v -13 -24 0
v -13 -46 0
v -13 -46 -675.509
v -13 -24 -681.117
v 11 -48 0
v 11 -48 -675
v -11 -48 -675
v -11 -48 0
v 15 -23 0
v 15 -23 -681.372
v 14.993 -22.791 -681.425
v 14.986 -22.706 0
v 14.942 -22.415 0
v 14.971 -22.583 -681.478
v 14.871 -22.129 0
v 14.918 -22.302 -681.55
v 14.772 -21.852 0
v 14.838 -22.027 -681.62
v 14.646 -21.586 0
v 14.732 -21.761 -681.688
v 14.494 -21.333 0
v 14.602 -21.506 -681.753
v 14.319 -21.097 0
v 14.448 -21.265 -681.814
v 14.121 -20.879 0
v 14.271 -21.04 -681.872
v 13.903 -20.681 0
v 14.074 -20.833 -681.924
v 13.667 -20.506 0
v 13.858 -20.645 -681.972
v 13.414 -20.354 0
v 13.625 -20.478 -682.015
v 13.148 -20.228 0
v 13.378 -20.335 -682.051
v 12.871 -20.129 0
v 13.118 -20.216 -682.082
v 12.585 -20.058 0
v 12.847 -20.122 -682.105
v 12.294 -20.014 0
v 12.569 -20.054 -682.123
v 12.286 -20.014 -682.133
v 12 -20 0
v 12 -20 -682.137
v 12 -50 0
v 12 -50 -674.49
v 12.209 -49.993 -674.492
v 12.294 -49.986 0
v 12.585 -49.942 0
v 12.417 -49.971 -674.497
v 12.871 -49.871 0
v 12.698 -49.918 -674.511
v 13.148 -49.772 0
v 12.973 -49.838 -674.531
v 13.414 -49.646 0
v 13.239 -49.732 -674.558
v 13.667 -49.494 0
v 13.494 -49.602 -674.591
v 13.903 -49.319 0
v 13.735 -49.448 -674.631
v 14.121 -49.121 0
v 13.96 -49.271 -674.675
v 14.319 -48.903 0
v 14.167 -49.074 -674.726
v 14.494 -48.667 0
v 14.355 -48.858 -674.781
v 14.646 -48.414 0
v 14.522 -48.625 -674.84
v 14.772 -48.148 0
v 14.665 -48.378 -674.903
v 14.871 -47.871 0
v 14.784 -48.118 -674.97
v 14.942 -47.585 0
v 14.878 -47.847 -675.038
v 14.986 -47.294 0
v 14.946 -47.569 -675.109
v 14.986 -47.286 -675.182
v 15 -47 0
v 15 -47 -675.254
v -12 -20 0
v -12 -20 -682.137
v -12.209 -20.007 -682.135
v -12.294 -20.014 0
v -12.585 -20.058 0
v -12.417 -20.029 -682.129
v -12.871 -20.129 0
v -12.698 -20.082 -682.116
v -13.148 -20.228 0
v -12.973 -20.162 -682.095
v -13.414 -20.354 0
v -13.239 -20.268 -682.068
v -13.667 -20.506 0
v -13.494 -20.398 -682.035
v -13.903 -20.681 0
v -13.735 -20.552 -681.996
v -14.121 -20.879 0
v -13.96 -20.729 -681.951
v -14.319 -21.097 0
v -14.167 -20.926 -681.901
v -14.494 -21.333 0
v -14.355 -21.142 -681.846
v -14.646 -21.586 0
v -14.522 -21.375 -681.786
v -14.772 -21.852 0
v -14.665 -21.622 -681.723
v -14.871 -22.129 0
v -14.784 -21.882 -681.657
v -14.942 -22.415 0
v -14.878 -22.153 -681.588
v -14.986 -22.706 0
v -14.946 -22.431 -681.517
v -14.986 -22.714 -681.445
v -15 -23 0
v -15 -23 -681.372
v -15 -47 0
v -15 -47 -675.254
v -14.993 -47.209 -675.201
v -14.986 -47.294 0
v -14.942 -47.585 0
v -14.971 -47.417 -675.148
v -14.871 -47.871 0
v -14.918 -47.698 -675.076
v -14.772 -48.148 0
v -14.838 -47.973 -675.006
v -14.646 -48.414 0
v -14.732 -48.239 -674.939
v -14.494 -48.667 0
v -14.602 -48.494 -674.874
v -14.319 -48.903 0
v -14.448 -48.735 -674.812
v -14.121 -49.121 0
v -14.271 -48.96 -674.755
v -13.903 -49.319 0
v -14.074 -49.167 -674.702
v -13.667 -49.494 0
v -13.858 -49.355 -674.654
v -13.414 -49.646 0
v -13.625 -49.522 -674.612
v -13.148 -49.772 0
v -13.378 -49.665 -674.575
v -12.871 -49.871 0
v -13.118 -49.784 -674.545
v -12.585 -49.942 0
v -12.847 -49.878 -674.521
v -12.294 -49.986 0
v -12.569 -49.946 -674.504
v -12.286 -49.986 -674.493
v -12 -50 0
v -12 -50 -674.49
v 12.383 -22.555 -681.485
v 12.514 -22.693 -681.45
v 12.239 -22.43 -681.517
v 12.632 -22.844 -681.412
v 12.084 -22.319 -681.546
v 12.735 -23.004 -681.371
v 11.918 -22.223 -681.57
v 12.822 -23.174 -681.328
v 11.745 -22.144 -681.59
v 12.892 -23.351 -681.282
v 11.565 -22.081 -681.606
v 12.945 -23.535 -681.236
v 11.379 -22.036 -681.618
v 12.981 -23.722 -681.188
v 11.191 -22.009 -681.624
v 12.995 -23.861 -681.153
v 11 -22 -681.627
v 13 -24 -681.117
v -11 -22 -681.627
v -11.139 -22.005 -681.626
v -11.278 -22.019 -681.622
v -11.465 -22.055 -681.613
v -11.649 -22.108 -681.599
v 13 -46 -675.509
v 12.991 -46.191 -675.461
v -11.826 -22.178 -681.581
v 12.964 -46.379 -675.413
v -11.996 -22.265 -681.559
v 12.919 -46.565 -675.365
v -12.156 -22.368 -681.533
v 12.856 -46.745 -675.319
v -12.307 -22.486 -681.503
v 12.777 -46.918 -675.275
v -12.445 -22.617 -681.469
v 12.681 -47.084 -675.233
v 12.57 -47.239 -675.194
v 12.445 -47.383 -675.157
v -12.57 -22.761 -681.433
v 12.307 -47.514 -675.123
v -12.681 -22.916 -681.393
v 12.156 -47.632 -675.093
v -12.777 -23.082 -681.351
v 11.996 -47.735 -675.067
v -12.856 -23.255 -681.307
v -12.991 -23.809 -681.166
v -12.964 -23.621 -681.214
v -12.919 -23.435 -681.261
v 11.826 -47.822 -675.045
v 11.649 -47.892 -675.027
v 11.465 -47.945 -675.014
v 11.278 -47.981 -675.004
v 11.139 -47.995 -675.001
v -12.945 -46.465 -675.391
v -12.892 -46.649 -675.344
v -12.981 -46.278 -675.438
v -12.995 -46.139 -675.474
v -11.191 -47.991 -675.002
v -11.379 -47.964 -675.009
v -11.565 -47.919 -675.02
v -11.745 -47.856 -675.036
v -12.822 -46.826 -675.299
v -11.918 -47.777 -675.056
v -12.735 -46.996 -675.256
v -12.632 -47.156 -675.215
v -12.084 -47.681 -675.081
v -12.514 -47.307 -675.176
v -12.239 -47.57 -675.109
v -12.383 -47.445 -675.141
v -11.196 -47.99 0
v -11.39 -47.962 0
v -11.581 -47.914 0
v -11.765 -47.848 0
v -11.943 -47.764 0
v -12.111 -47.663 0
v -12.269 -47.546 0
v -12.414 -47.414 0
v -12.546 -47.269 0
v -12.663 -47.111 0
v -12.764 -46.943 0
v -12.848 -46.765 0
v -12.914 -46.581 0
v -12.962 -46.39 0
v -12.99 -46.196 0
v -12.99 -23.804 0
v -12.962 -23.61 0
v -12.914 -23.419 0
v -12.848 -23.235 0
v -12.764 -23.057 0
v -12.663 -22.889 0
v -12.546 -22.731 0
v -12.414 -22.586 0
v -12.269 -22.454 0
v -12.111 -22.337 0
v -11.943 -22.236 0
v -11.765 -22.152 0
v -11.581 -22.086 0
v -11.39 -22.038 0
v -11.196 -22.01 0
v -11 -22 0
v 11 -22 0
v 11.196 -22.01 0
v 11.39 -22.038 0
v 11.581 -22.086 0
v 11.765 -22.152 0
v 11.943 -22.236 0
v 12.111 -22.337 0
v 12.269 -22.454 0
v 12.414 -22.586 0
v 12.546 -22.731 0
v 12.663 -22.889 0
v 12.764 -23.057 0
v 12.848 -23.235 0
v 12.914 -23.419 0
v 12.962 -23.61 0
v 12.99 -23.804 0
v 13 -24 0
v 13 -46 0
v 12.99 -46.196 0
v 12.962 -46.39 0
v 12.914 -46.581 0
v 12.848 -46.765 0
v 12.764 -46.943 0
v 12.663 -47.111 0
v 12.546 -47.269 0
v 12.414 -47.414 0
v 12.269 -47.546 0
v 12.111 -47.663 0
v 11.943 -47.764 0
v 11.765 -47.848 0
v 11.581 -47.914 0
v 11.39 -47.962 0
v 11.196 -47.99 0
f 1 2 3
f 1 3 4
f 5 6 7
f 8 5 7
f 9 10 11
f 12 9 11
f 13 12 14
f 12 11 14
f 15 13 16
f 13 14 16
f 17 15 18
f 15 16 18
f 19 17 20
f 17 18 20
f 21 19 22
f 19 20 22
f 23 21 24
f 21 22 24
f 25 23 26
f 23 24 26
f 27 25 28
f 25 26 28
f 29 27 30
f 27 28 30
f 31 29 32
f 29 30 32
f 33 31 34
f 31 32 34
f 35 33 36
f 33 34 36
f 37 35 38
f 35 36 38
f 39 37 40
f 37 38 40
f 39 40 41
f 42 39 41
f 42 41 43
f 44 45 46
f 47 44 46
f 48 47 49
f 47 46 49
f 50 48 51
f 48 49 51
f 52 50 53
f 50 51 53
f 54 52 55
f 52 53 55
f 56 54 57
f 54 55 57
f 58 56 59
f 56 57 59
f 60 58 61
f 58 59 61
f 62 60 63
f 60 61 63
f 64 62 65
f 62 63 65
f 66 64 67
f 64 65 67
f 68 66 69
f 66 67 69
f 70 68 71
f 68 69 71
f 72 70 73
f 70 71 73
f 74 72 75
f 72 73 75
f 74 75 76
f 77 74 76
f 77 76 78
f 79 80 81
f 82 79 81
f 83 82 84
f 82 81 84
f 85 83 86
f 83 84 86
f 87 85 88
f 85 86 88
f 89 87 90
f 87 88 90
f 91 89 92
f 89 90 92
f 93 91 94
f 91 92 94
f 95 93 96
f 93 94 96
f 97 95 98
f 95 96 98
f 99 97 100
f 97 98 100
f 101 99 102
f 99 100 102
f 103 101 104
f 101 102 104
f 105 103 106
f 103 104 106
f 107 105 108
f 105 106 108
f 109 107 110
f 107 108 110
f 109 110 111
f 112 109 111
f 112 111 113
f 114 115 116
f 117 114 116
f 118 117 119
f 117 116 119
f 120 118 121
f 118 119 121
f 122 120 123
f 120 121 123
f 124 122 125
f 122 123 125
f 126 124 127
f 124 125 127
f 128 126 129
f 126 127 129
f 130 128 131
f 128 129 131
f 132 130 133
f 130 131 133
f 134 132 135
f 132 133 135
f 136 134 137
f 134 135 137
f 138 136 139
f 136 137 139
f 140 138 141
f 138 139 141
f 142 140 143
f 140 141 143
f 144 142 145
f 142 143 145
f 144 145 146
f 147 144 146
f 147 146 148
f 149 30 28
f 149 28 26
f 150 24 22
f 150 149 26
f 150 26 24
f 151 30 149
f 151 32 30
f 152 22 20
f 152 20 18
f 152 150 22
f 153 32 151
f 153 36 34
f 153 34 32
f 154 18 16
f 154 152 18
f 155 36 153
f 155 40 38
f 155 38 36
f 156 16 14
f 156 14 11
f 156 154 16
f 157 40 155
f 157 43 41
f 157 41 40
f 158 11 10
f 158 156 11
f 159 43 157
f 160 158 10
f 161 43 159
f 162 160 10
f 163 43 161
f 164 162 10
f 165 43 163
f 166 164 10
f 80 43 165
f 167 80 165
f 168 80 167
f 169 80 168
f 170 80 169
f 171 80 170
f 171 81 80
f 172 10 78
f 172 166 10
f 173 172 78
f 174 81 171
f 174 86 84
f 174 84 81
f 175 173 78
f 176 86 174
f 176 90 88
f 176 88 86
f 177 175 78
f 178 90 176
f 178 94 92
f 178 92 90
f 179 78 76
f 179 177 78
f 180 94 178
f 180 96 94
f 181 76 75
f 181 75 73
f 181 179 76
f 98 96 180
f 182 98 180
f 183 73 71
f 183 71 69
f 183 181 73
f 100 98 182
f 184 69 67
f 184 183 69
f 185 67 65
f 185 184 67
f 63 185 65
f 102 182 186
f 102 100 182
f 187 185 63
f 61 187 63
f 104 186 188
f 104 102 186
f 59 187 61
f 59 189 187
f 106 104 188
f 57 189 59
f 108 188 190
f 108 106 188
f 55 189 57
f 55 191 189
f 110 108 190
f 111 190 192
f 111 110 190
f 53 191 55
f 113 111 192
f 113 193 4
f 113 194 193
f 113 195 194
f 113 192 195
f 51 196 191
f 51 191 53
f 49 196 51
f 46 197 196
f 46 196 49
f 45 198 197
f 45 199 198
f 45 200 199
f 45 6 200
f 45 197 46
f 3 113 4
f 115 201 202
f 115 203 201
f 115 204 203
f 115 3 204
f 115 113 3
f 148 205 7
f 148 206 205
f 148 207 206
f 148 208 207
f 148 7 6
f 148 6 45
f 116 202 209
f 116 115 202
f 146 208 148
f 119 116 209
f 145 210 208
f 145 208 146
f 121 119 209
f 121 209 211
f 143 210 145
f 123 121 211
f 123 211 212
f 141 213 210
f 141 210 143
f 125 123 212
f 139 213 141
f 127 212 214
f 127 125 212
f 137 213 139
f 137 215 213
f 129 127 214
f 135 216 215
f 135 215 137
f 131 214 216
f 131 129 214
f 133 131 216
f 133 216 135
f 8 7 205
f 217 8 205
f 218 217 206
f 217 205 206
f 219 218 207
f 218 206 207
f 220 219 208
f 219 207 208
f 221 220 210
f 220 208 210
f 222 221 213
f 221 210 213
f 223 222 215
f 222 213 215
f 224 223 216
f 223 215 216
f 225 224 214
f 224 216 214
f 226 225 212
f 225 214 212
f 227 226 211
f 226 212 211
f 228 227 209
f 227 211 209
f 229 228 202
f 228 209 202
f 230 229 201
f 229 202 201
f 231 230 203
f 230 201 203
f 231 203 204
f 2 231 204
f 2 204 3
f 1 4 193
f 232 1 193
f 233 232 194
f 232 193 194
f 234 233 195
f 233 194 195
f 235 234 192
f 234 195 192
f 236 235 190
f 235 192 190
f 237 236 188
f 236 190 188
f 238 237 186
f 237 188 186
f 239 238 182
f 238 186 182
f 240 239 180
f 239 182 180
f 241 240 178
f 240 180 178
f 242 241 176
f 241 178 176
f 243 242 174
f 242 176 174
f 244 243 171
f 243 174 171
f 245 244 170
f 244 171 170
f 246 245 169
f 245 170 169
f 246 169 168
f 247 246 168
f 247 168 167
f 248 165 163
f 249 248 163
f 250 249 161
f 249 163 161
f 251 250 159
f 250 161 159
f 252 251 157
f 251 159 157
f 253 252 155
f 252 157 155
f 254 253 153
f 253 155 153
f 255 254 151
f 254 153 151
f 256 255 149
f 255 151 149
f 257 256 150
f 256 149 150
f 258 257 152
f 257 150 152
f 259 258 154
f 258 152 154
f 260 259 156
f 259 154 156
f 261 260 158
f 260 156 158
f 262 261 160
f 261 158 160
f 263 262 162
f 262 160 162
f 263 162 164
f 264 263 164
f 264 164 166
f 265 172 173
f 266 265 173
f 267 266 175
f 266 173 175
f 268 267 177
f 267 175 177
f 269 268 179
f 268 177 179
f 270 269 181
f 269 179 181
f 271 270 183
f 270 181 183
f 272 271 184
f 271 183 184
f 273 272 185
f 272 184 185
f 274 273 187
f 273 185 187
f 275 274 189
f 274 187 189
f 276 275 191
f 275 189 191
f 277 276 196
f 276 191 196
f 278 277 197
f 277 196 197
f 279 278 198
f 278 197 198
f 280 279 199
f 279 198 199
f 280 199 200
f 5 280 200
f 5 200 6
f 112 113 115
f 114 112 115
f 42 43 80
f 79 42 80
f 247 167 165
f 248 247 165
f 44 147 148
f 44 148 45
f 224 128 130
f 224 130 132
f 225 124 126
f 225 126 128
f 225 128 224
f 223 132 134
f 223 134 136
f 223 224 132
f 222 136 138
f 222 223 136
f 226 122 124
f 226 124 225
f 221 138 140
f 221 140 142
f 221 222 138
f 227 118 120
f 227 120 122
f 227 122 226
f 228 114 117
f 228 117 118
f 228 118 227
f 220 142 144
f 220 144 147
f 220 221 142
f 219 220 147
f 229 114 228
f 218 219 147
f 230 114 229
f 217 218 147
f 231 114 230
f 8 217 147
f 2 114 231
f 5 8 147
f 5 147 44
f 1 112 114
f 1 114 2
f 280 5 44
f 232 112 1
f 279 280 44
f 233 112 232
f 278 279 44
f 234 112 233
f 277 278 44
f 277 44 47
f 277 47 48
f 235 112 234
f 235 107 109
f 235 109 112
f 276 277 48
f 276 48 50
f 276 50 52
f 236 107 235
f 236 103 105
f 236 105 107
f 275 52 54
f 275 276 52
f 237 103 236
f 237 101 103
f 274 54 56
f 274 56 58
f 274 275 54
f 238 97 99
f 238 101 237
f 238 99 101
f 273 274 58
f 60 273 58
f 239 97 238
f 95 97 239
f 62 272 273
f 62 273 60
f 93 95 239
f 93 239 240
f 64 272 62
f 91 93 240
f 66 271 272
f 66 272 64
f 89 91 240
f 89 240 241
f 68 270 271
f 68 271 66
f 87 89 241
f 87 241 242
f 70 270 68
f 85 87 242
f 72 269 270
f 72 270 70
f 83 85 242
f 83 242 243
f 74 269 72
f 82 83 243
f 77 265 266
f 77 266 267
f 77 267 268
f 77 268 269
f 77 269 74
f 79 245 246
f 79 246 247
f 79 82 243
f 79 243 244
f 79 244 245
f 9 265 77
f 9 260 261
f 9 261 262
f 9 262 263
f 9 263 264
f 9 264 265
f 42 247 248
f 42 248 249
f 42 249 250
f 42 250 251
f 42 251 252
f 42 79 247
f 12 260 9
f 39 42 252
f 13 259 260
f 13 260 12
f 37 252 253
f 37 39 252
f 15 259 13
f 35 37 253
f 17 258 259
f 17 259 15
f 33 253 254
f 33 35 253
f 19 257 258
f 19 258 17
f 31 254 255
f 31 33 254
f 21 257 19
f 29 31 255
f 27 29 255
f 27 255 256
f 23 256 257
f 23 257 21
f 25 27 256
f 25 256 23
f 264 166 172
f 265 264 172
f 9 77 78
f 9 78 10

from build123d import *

# Parameters (mm, degrees)
EXTRUDE_START       = -864.980118087
EXTRUDE_1_DEPTH     = 864.980118087
CUT_EXTRUDE_1_DEPTH = 867.94325344


# Read off the part's stored shape, not the designer's step: Бобышка-Вытянуть1
with BuildPart() as part:
    # Бобышка-Вытянуть1 outline → Бобышка-Вытянуть1 (new body)
    with BuildSketch(Plane.XY.offset(EXTRUDE_START)):
        with BuildLine():
            Line((-15, -23), (-15, -47))
            ThreePointArc((-15, -47), (-14.121320344, -49.121320344), (-12, -50))
            Line((-12, -50), (12, -50))
            ThreePointArc((12, -50), (14.121320344, -49.121320344), (15, -47))
            Line((15, -47), (15, -23))
            ThreePointArc((15, -23), (14.121320344, -20.878679656), (12, -20))
            Line((12, -20), (-12, -20))
            ThreePointArc((-12, -20), (-14.121320344, -20.878679656), (-15, -23))
        make_face()
        with BuildLine():
            ThreePointArc((-11, -48), (-12.414213562, -47.414213562), (-13, -46))
            Line((-13, -46), (-13, -24))
            ThreePointArc((-13, -24), (-12.414213562, -22.585786438), (-11, -22))
            Line((-11, -22), (11, -22))
            ThreePointArc((11, -22), (12.414213562, -22.585786438), (13, -24))
            Line((13, -24), (13, -46))
            ThreePointArc((13, -46), (12.414213562, -47.414213562), (11, -48))
            Line((11, -48), (-11, -48))
        make_face(mode=Mode.SUBTRACT)
    extrude(amount=EXTRUDE_1_DEPTH)

    # Эскиз2 → Вырез-Вытянуть1 (cut, through all)
    with BuildSketch(Plane.ZY.offset(15)):
        Polygon((-682.136609507, -20), (-674.48972614, -50), (-864.980118087, -50), (-864.980118087, -20), align=None)
    extrude(amount=-CUT_EXTRUDE_1_DEPTH, mode=Mode.SUBTRACT)


solid = part.part
